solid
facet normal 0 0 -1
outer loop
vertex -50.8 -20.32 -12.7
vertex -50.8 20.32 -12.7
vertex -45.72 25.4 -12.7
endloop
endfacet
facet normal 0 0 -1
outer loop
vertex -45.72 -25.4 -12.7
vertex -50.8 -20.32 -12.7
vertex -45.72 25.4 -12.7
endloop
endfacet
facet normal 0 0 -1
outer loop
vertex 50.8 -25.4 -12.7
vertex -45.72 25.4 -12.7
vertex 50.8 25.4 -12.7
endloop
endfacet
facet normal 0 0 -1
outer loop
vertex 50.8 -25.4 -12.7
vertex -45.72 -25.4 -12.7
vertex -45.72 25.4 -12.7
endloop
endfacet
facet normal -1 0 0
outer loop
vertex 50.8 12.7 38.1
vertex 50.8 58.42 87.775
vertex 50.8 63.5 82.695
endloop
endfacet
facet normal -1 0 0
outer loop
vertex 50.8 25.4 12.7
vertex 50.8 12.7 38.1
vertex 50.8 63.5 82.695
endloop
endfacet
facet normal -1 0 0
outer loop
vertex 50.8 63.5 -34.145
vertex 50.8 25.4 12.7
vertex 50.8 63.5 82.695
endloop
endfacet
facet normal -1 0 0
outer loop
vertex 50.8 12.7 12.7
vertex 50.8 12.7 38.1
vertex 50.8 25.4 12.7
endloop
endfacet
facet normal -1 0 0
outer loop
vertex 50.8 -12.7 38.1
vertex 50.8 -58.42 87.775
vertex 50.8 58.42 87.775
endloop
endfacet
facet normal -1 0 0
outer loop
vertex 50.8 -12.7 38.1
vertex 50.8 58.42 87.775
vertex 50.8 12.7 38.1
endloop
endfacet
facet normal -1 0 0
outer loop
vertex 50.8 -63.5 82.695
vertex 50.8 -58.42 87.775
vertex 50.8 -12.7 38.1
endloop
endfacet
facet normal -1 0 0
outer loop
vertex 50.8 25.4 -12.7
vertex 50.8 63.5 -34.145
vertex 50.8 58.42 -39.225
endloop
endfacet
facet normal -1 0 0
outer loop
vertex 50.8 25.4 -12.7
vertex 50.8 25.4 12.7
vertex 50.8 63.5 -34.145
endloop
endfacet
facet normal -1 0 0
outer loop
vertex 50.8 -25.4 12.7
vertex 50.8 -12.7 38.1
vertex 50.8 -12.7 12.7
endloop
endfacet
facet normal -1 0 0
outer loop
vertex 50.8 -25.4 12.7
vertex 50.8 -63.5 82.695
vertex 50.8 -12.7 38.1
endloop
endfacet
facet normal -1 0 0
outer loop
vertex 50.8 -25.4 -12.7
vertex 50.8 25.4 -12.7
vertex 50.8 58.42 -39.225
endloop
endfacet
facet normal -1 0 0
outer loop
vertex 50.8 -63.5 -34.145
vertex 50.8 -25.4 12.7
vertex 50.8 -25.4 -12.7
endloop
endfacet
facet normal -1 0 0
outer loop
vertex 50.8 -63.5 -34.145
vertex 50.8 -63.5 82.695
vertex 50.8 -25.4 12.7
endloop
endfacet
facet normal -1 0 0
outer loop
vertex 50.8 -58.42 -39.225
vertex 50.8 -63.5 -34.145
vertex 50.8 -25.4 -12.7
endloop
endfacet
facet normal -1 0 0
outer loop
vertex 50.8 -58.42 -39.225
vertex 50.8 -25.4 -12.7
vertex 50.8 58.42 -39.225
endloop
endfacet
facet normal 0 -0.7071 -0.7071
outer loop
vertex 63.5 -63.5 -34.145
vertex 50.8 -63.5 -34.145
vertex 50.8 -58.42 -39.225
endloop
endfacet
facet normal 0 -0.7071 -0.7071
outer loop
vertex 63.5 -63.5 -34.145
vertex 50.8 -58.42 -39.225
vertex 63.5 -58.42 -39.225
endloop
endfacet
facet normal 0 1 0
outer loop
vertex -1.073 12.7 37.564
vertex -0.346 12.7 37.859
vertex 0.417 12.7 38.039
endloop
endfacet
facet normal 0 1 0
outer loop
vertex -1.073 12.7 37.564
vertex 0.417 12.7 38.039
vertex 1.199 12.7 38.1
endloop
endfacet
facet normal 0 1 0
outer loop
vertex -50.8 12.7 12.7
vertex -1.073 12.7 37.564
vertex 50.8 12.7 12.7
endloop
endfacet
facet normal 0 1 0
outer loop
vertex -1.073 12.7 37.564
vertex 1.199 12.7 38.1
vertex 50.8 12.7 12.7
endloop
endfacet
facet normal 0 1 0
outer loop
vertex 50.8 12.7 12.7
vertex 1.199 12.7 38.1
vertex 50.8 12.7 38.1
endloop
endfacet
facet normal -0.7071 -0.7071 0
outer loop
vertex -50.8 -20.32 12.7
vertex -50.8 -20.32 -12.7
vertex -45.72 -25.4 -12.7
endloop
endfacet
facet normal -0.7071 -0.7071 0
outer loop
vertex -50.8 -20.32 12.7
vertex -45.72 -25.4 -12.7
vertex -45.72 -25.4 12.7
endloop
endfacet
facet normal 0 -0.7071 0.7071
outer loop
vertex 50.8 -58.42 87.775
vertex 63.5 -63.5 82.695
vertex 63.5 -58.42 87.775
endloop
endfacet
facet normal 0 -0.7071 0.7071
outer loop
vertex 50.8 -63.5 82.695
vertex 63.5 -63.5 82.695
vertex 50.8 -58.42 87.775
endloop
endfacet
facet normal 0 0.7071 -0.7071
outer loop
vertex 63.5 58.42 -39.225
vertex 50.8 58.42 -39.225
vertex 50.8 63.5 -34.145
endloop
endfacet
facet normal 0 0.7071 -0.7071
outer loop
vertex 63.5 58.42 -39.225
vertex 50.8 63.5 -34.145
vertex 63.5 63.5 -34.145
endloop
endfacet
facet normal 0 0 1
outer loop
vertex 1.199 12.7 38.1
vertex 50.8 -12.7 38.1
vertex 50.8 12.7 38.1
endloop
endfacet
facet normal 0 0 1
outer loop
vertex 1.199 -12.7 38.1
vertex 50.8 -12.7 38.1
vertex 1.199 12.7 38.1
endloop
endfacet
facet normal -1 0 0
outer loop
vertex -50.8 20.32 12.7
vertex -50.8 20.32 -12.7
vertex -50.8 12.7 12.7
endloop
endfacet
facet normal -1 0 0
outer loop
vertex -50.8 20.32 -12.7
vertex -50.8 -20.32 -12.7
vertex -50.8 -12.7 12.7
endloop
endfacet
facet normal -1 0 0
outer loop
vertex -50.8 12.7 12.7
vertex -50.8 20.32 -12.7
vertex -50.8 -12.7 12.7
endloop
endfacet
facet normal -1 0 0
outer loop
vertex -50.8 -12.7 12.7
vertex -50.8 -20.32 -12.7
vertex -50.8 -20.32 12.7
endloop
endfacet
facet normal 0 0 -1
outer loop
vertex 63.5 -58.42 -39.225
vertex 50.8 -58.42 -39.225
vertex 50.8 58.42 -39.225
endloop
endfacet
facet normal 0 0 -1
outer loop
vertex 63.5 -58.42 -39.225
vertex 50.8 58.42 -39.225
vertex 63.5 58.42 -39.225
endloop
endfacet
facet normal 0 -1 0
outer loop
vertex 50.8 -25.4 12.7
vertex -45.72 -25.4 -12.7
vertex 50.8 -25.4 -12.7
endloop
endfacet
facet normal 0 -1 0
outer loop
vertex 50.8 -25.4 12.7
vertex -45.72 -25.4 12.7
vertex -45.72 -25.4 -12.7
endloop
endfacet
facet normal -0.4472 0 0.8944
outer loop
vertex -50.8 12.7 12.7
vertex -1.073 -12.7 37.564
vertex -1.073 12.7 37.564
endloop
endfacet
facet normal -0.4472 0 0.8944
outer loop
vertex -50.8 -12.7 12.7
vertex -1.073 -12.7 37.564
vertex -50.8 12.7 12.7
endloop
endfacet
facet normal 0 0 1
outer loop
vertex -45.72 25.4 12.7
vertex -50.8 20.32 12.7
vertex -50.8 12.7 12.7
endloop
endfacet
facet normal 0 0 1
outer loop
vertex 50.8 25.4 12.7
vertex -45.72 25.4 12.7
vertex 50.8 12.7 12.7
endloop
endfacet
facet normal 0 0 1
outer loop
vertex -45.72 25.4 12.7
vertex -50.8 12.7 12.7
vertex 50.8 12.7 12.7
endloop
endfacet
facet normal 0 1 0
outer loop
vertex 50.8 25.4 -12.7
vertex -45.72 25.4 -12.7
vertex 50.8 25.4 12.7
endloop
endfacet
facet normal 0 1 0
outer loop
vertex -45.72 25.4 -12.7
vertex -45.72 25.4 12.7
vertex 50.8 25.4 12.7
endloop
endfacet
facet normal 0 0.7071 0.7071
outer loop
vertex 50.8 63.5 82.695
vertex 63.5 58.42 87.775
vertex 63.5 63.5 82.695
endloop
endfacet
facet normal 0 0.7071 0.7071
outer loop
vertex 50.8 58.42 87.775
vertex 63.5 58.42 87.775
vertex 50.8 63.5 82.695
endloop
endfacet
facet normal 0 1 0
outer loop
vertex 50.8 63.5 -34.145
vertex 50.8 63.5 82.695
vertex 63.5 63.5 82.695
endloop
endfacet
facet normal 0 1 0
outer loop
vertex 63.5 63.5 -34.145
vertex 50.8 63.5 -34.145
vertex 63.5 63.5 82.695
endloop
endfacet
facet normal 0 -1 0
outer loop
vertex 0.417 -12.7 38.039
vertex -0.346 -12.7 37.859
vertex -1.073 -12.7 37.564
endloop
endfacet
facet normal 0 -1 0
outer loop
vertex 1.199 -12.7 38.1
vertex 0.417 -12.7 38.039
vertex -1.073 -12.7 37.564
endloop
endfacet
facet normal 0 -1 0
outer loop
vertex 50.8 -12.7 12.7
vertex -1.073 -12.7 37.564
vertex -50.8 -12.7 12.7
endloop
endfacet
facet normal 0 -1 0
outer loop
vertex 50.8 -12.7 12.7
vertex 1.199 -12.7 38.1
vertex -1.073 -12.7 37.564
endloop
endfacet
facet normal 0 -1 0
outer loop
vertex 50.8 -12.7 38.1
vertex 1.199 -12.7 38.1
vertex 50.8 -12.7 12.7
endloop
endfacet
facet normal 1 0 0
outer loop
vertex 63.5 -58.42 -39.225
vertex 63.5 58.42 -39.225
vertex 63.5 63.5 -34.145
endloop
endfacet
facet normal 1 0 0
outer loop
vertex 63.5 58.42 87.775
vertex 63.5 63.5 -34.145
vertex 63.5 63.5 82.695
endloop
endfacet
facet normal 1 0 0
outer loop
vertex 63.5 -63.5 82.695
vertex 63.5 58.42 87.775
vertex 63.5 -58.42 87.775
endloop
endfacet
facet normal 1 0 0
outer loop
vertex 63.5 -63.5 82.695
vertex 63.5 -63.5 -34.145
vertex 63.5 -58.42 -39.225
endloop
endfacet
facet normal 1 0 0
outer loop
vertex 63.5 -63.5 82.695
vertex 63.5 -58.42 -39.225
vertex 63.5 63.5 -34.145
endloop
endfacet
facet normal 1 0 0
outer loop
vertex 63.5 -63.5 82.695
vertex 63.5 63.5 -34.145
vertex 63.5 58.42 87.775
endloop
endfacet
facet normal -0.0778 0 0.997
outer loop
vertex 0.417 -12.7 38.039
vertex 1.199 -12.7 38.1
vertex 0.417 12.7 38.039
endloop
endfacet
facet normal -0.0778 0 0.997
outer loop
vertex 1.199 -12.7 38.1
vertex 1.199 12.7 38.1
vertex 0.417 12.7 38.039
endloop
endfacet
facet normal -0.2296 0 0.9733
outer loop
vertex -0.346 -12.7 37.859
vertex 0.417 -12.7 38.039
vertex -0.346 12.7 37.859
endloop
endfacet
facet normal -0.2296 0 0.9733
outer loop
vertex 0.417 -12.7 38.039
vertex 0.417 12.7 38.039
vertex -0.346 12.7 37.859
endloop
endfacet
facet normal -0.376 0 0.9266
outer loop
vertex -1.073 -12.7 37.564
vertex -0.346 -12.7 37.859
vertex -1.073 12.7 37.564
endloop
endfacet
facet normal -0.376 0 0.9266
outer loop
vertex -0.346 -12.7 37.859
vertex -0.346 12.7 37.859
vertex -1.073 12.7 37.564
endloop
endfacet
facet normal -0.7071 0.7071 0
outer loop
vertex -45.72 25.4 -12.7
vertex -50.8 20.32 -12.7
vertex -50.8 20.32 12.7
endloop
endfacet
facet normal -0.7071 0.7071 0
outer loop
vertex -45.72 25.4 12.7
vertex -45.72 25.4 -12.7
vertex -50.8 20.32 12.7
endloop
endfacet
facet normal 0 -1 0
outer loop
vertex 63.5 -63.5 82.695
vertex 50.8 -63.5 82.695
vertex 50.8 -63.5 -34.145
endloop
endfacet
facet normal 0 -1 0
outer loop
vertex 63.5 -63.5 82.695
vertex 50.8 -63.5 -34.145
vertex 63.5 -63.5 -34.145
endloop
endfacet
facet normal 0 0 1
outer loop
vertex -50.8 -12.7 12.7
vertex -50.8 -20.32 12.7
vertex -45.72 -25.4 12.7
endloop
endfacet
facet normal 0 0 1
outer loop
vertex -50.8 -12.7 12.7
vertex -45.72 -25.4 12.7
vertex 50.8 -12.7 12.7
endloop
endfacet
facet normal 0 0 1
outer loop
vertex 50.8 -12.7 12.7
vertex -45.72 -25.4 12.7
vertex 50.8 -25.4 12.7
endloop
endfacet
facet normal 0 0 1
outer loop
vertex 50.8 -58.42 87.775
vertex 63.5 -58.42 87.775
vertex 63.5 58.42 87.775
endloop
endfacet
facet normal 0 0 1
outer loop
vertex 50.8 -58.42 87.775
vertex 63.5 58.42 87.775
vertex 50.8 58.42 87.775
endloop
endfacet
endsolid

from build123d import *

# Parameters (mm, degrees)
F0_W     = 101.6
F0_H     = 25.4
F1_DEPTH = 25.4
F2_DEPTH = 12.7
F3_DEPTH = 63.5
F4_R     = 5.08
F5_SIZE  = 5.08


with BuildPart() as f1:
    # F0 (on Front) → F1 (new body, symmetric)
    with BuildSketch(Plane.XZ):
        Rectangle(F0_W, F0_H)
    extrude(amount=F1_DEPTH, both=True)

    # F0 (on Front) → F2 (join, symmetric)
    with BuildSketch(Plane.XZ):
        Polygon((-50.8, 12.7), (50.8, 12.7), (50.8, 38.1), (0, 38.1), align=None)
    extrude(amount=F2_DEPTH, both=True)

    # F0 (on Front) → F3 (join, symmetric)
    with BuildSketch(Plane.XZ):
        Polygon((50.8, 12.7), (50.8, -12.7), (50.8, -39.22494), (63.5, -39.22494), (63.5, 87.77506), (50.8, 87.77506), (50.8, 38.1), align=None)
    extrude(amount=F3_DEPTH, both=True)

    # F4
    f4_edges = [f1.edges().sort_by_distance(p)[0] for p in [
        (0, 0, 38.1),
    ]]
    fillet(f4_edges, radius=F4_R)

    # F5
    f5_edges = [f1.edges().sort_by_distance(p)[0] for p in [
        (57.15, 63.5, 87.77506),
        (57.15, -63.5, 87.77506),
        (57.15, 63.5, -39.22494),
        (57.15, -63.5, -39.22494),
        (-50.8, 25.4, 0),
        (-50.8, -25.4, 0),
    ]]
    chamfer(f5_edges, length=F5_SIZE)


solid = f1.part
